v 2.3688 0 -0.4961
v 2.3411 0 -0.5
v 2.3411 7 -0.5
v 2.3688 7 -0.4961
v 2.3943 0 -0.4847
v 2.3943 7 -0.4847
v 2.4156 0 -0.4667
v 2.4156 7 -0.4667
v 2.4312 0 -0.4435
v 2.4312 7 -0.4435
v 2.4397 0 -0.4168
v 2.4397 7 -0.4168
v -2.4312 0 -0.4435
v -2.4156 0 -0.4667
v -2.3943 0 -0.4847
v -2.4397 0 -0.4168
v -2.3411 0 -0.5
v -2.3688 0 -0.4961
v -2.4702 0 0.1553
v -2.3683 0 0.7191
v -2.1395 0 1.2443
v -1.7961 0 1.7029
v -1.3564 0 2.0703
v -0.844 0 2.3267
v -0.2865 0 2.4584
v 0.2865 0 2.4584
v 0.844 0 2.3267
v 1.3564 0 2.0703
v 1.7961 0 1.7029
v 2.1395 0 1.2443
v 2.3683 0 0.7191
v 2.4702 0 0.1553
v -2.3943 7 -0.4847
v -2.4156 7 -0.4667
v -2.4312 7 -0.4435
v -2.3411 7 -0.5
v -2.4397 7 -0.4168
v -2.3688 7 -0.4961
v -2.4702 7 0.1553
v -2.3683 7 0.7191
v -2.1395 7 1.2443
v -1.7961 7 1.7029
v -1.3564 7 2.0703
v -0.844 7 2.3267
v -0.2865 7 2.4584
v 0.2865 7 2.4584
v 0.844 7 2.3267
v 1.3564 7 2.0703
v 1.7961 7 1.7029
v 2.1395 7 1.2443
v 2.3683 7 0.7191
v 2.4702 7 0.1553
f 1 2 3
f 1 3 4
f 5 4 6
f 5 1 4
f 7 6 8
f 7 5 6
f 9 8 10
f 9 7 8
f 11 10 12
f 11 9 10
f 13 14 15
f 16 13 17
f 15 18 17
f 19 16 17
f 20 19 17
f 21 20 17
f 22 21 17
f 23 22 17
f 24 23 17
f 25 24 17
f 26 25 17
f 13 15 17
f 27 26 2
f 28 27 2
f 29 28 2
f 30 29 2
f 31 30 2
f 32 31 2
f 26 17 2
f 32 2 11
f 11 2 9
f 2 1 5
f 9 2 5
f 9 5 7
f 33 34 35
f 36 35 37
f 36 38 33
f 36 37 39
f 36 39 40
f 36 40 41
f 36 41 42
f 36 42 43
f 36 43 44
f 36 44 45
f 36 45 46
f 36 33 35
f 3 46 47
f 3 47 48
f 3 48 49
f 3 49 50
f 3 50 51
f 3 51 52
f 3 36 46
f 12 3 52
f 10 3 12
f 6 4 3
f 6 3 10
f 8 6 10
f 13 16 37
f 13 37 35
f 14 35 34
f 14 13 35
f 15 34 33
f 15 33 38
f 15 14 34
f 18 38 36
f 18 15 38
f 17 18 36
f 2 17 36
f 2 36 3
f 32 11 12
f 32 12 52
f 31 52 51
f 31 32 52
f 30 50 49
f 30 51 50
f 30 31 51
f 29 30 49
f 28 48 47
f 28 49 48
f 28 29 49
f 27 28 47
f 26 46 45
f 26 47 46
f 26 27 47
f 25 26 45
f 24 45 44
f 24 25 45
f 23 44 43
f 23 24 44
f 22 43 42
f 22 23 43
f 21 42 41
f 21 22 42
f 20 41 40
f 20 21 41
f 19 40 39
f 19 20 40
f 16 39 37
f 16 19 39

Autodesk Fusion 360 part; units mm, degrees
sketch "Sketch1" plane through (0, 0, 0) normal (0, 1, 0) x (1, 0, 0)
  line L0 (0, 0) -> (0, 0.5)
  line L1 (0, 0.5) -> (0.1389, 0.5)
  line L2 (0.1389, 0.5) -> (2.424, 0.5)
  line L3 (0, 0.5) -> (-2.424, 0.5)
  arc A0 (-2.424, 0.5) -> (2.424, 0.5) centre (0, 0) ccw
  dimension "d1" = 4.95
  dimension "d2" = 0.5
extrude "Extrude1" add sketch "Sketch1" along normal blind 3
fillet "Fillet1" radius 0.1 2 edges at (2.424, 1.5, -0.5) (-2.424, 1.5, -0.5)
extrude "Extrude2" add 1 faces at (0, 3, 0.4917) along direction (0, 1, 0) blind 4
